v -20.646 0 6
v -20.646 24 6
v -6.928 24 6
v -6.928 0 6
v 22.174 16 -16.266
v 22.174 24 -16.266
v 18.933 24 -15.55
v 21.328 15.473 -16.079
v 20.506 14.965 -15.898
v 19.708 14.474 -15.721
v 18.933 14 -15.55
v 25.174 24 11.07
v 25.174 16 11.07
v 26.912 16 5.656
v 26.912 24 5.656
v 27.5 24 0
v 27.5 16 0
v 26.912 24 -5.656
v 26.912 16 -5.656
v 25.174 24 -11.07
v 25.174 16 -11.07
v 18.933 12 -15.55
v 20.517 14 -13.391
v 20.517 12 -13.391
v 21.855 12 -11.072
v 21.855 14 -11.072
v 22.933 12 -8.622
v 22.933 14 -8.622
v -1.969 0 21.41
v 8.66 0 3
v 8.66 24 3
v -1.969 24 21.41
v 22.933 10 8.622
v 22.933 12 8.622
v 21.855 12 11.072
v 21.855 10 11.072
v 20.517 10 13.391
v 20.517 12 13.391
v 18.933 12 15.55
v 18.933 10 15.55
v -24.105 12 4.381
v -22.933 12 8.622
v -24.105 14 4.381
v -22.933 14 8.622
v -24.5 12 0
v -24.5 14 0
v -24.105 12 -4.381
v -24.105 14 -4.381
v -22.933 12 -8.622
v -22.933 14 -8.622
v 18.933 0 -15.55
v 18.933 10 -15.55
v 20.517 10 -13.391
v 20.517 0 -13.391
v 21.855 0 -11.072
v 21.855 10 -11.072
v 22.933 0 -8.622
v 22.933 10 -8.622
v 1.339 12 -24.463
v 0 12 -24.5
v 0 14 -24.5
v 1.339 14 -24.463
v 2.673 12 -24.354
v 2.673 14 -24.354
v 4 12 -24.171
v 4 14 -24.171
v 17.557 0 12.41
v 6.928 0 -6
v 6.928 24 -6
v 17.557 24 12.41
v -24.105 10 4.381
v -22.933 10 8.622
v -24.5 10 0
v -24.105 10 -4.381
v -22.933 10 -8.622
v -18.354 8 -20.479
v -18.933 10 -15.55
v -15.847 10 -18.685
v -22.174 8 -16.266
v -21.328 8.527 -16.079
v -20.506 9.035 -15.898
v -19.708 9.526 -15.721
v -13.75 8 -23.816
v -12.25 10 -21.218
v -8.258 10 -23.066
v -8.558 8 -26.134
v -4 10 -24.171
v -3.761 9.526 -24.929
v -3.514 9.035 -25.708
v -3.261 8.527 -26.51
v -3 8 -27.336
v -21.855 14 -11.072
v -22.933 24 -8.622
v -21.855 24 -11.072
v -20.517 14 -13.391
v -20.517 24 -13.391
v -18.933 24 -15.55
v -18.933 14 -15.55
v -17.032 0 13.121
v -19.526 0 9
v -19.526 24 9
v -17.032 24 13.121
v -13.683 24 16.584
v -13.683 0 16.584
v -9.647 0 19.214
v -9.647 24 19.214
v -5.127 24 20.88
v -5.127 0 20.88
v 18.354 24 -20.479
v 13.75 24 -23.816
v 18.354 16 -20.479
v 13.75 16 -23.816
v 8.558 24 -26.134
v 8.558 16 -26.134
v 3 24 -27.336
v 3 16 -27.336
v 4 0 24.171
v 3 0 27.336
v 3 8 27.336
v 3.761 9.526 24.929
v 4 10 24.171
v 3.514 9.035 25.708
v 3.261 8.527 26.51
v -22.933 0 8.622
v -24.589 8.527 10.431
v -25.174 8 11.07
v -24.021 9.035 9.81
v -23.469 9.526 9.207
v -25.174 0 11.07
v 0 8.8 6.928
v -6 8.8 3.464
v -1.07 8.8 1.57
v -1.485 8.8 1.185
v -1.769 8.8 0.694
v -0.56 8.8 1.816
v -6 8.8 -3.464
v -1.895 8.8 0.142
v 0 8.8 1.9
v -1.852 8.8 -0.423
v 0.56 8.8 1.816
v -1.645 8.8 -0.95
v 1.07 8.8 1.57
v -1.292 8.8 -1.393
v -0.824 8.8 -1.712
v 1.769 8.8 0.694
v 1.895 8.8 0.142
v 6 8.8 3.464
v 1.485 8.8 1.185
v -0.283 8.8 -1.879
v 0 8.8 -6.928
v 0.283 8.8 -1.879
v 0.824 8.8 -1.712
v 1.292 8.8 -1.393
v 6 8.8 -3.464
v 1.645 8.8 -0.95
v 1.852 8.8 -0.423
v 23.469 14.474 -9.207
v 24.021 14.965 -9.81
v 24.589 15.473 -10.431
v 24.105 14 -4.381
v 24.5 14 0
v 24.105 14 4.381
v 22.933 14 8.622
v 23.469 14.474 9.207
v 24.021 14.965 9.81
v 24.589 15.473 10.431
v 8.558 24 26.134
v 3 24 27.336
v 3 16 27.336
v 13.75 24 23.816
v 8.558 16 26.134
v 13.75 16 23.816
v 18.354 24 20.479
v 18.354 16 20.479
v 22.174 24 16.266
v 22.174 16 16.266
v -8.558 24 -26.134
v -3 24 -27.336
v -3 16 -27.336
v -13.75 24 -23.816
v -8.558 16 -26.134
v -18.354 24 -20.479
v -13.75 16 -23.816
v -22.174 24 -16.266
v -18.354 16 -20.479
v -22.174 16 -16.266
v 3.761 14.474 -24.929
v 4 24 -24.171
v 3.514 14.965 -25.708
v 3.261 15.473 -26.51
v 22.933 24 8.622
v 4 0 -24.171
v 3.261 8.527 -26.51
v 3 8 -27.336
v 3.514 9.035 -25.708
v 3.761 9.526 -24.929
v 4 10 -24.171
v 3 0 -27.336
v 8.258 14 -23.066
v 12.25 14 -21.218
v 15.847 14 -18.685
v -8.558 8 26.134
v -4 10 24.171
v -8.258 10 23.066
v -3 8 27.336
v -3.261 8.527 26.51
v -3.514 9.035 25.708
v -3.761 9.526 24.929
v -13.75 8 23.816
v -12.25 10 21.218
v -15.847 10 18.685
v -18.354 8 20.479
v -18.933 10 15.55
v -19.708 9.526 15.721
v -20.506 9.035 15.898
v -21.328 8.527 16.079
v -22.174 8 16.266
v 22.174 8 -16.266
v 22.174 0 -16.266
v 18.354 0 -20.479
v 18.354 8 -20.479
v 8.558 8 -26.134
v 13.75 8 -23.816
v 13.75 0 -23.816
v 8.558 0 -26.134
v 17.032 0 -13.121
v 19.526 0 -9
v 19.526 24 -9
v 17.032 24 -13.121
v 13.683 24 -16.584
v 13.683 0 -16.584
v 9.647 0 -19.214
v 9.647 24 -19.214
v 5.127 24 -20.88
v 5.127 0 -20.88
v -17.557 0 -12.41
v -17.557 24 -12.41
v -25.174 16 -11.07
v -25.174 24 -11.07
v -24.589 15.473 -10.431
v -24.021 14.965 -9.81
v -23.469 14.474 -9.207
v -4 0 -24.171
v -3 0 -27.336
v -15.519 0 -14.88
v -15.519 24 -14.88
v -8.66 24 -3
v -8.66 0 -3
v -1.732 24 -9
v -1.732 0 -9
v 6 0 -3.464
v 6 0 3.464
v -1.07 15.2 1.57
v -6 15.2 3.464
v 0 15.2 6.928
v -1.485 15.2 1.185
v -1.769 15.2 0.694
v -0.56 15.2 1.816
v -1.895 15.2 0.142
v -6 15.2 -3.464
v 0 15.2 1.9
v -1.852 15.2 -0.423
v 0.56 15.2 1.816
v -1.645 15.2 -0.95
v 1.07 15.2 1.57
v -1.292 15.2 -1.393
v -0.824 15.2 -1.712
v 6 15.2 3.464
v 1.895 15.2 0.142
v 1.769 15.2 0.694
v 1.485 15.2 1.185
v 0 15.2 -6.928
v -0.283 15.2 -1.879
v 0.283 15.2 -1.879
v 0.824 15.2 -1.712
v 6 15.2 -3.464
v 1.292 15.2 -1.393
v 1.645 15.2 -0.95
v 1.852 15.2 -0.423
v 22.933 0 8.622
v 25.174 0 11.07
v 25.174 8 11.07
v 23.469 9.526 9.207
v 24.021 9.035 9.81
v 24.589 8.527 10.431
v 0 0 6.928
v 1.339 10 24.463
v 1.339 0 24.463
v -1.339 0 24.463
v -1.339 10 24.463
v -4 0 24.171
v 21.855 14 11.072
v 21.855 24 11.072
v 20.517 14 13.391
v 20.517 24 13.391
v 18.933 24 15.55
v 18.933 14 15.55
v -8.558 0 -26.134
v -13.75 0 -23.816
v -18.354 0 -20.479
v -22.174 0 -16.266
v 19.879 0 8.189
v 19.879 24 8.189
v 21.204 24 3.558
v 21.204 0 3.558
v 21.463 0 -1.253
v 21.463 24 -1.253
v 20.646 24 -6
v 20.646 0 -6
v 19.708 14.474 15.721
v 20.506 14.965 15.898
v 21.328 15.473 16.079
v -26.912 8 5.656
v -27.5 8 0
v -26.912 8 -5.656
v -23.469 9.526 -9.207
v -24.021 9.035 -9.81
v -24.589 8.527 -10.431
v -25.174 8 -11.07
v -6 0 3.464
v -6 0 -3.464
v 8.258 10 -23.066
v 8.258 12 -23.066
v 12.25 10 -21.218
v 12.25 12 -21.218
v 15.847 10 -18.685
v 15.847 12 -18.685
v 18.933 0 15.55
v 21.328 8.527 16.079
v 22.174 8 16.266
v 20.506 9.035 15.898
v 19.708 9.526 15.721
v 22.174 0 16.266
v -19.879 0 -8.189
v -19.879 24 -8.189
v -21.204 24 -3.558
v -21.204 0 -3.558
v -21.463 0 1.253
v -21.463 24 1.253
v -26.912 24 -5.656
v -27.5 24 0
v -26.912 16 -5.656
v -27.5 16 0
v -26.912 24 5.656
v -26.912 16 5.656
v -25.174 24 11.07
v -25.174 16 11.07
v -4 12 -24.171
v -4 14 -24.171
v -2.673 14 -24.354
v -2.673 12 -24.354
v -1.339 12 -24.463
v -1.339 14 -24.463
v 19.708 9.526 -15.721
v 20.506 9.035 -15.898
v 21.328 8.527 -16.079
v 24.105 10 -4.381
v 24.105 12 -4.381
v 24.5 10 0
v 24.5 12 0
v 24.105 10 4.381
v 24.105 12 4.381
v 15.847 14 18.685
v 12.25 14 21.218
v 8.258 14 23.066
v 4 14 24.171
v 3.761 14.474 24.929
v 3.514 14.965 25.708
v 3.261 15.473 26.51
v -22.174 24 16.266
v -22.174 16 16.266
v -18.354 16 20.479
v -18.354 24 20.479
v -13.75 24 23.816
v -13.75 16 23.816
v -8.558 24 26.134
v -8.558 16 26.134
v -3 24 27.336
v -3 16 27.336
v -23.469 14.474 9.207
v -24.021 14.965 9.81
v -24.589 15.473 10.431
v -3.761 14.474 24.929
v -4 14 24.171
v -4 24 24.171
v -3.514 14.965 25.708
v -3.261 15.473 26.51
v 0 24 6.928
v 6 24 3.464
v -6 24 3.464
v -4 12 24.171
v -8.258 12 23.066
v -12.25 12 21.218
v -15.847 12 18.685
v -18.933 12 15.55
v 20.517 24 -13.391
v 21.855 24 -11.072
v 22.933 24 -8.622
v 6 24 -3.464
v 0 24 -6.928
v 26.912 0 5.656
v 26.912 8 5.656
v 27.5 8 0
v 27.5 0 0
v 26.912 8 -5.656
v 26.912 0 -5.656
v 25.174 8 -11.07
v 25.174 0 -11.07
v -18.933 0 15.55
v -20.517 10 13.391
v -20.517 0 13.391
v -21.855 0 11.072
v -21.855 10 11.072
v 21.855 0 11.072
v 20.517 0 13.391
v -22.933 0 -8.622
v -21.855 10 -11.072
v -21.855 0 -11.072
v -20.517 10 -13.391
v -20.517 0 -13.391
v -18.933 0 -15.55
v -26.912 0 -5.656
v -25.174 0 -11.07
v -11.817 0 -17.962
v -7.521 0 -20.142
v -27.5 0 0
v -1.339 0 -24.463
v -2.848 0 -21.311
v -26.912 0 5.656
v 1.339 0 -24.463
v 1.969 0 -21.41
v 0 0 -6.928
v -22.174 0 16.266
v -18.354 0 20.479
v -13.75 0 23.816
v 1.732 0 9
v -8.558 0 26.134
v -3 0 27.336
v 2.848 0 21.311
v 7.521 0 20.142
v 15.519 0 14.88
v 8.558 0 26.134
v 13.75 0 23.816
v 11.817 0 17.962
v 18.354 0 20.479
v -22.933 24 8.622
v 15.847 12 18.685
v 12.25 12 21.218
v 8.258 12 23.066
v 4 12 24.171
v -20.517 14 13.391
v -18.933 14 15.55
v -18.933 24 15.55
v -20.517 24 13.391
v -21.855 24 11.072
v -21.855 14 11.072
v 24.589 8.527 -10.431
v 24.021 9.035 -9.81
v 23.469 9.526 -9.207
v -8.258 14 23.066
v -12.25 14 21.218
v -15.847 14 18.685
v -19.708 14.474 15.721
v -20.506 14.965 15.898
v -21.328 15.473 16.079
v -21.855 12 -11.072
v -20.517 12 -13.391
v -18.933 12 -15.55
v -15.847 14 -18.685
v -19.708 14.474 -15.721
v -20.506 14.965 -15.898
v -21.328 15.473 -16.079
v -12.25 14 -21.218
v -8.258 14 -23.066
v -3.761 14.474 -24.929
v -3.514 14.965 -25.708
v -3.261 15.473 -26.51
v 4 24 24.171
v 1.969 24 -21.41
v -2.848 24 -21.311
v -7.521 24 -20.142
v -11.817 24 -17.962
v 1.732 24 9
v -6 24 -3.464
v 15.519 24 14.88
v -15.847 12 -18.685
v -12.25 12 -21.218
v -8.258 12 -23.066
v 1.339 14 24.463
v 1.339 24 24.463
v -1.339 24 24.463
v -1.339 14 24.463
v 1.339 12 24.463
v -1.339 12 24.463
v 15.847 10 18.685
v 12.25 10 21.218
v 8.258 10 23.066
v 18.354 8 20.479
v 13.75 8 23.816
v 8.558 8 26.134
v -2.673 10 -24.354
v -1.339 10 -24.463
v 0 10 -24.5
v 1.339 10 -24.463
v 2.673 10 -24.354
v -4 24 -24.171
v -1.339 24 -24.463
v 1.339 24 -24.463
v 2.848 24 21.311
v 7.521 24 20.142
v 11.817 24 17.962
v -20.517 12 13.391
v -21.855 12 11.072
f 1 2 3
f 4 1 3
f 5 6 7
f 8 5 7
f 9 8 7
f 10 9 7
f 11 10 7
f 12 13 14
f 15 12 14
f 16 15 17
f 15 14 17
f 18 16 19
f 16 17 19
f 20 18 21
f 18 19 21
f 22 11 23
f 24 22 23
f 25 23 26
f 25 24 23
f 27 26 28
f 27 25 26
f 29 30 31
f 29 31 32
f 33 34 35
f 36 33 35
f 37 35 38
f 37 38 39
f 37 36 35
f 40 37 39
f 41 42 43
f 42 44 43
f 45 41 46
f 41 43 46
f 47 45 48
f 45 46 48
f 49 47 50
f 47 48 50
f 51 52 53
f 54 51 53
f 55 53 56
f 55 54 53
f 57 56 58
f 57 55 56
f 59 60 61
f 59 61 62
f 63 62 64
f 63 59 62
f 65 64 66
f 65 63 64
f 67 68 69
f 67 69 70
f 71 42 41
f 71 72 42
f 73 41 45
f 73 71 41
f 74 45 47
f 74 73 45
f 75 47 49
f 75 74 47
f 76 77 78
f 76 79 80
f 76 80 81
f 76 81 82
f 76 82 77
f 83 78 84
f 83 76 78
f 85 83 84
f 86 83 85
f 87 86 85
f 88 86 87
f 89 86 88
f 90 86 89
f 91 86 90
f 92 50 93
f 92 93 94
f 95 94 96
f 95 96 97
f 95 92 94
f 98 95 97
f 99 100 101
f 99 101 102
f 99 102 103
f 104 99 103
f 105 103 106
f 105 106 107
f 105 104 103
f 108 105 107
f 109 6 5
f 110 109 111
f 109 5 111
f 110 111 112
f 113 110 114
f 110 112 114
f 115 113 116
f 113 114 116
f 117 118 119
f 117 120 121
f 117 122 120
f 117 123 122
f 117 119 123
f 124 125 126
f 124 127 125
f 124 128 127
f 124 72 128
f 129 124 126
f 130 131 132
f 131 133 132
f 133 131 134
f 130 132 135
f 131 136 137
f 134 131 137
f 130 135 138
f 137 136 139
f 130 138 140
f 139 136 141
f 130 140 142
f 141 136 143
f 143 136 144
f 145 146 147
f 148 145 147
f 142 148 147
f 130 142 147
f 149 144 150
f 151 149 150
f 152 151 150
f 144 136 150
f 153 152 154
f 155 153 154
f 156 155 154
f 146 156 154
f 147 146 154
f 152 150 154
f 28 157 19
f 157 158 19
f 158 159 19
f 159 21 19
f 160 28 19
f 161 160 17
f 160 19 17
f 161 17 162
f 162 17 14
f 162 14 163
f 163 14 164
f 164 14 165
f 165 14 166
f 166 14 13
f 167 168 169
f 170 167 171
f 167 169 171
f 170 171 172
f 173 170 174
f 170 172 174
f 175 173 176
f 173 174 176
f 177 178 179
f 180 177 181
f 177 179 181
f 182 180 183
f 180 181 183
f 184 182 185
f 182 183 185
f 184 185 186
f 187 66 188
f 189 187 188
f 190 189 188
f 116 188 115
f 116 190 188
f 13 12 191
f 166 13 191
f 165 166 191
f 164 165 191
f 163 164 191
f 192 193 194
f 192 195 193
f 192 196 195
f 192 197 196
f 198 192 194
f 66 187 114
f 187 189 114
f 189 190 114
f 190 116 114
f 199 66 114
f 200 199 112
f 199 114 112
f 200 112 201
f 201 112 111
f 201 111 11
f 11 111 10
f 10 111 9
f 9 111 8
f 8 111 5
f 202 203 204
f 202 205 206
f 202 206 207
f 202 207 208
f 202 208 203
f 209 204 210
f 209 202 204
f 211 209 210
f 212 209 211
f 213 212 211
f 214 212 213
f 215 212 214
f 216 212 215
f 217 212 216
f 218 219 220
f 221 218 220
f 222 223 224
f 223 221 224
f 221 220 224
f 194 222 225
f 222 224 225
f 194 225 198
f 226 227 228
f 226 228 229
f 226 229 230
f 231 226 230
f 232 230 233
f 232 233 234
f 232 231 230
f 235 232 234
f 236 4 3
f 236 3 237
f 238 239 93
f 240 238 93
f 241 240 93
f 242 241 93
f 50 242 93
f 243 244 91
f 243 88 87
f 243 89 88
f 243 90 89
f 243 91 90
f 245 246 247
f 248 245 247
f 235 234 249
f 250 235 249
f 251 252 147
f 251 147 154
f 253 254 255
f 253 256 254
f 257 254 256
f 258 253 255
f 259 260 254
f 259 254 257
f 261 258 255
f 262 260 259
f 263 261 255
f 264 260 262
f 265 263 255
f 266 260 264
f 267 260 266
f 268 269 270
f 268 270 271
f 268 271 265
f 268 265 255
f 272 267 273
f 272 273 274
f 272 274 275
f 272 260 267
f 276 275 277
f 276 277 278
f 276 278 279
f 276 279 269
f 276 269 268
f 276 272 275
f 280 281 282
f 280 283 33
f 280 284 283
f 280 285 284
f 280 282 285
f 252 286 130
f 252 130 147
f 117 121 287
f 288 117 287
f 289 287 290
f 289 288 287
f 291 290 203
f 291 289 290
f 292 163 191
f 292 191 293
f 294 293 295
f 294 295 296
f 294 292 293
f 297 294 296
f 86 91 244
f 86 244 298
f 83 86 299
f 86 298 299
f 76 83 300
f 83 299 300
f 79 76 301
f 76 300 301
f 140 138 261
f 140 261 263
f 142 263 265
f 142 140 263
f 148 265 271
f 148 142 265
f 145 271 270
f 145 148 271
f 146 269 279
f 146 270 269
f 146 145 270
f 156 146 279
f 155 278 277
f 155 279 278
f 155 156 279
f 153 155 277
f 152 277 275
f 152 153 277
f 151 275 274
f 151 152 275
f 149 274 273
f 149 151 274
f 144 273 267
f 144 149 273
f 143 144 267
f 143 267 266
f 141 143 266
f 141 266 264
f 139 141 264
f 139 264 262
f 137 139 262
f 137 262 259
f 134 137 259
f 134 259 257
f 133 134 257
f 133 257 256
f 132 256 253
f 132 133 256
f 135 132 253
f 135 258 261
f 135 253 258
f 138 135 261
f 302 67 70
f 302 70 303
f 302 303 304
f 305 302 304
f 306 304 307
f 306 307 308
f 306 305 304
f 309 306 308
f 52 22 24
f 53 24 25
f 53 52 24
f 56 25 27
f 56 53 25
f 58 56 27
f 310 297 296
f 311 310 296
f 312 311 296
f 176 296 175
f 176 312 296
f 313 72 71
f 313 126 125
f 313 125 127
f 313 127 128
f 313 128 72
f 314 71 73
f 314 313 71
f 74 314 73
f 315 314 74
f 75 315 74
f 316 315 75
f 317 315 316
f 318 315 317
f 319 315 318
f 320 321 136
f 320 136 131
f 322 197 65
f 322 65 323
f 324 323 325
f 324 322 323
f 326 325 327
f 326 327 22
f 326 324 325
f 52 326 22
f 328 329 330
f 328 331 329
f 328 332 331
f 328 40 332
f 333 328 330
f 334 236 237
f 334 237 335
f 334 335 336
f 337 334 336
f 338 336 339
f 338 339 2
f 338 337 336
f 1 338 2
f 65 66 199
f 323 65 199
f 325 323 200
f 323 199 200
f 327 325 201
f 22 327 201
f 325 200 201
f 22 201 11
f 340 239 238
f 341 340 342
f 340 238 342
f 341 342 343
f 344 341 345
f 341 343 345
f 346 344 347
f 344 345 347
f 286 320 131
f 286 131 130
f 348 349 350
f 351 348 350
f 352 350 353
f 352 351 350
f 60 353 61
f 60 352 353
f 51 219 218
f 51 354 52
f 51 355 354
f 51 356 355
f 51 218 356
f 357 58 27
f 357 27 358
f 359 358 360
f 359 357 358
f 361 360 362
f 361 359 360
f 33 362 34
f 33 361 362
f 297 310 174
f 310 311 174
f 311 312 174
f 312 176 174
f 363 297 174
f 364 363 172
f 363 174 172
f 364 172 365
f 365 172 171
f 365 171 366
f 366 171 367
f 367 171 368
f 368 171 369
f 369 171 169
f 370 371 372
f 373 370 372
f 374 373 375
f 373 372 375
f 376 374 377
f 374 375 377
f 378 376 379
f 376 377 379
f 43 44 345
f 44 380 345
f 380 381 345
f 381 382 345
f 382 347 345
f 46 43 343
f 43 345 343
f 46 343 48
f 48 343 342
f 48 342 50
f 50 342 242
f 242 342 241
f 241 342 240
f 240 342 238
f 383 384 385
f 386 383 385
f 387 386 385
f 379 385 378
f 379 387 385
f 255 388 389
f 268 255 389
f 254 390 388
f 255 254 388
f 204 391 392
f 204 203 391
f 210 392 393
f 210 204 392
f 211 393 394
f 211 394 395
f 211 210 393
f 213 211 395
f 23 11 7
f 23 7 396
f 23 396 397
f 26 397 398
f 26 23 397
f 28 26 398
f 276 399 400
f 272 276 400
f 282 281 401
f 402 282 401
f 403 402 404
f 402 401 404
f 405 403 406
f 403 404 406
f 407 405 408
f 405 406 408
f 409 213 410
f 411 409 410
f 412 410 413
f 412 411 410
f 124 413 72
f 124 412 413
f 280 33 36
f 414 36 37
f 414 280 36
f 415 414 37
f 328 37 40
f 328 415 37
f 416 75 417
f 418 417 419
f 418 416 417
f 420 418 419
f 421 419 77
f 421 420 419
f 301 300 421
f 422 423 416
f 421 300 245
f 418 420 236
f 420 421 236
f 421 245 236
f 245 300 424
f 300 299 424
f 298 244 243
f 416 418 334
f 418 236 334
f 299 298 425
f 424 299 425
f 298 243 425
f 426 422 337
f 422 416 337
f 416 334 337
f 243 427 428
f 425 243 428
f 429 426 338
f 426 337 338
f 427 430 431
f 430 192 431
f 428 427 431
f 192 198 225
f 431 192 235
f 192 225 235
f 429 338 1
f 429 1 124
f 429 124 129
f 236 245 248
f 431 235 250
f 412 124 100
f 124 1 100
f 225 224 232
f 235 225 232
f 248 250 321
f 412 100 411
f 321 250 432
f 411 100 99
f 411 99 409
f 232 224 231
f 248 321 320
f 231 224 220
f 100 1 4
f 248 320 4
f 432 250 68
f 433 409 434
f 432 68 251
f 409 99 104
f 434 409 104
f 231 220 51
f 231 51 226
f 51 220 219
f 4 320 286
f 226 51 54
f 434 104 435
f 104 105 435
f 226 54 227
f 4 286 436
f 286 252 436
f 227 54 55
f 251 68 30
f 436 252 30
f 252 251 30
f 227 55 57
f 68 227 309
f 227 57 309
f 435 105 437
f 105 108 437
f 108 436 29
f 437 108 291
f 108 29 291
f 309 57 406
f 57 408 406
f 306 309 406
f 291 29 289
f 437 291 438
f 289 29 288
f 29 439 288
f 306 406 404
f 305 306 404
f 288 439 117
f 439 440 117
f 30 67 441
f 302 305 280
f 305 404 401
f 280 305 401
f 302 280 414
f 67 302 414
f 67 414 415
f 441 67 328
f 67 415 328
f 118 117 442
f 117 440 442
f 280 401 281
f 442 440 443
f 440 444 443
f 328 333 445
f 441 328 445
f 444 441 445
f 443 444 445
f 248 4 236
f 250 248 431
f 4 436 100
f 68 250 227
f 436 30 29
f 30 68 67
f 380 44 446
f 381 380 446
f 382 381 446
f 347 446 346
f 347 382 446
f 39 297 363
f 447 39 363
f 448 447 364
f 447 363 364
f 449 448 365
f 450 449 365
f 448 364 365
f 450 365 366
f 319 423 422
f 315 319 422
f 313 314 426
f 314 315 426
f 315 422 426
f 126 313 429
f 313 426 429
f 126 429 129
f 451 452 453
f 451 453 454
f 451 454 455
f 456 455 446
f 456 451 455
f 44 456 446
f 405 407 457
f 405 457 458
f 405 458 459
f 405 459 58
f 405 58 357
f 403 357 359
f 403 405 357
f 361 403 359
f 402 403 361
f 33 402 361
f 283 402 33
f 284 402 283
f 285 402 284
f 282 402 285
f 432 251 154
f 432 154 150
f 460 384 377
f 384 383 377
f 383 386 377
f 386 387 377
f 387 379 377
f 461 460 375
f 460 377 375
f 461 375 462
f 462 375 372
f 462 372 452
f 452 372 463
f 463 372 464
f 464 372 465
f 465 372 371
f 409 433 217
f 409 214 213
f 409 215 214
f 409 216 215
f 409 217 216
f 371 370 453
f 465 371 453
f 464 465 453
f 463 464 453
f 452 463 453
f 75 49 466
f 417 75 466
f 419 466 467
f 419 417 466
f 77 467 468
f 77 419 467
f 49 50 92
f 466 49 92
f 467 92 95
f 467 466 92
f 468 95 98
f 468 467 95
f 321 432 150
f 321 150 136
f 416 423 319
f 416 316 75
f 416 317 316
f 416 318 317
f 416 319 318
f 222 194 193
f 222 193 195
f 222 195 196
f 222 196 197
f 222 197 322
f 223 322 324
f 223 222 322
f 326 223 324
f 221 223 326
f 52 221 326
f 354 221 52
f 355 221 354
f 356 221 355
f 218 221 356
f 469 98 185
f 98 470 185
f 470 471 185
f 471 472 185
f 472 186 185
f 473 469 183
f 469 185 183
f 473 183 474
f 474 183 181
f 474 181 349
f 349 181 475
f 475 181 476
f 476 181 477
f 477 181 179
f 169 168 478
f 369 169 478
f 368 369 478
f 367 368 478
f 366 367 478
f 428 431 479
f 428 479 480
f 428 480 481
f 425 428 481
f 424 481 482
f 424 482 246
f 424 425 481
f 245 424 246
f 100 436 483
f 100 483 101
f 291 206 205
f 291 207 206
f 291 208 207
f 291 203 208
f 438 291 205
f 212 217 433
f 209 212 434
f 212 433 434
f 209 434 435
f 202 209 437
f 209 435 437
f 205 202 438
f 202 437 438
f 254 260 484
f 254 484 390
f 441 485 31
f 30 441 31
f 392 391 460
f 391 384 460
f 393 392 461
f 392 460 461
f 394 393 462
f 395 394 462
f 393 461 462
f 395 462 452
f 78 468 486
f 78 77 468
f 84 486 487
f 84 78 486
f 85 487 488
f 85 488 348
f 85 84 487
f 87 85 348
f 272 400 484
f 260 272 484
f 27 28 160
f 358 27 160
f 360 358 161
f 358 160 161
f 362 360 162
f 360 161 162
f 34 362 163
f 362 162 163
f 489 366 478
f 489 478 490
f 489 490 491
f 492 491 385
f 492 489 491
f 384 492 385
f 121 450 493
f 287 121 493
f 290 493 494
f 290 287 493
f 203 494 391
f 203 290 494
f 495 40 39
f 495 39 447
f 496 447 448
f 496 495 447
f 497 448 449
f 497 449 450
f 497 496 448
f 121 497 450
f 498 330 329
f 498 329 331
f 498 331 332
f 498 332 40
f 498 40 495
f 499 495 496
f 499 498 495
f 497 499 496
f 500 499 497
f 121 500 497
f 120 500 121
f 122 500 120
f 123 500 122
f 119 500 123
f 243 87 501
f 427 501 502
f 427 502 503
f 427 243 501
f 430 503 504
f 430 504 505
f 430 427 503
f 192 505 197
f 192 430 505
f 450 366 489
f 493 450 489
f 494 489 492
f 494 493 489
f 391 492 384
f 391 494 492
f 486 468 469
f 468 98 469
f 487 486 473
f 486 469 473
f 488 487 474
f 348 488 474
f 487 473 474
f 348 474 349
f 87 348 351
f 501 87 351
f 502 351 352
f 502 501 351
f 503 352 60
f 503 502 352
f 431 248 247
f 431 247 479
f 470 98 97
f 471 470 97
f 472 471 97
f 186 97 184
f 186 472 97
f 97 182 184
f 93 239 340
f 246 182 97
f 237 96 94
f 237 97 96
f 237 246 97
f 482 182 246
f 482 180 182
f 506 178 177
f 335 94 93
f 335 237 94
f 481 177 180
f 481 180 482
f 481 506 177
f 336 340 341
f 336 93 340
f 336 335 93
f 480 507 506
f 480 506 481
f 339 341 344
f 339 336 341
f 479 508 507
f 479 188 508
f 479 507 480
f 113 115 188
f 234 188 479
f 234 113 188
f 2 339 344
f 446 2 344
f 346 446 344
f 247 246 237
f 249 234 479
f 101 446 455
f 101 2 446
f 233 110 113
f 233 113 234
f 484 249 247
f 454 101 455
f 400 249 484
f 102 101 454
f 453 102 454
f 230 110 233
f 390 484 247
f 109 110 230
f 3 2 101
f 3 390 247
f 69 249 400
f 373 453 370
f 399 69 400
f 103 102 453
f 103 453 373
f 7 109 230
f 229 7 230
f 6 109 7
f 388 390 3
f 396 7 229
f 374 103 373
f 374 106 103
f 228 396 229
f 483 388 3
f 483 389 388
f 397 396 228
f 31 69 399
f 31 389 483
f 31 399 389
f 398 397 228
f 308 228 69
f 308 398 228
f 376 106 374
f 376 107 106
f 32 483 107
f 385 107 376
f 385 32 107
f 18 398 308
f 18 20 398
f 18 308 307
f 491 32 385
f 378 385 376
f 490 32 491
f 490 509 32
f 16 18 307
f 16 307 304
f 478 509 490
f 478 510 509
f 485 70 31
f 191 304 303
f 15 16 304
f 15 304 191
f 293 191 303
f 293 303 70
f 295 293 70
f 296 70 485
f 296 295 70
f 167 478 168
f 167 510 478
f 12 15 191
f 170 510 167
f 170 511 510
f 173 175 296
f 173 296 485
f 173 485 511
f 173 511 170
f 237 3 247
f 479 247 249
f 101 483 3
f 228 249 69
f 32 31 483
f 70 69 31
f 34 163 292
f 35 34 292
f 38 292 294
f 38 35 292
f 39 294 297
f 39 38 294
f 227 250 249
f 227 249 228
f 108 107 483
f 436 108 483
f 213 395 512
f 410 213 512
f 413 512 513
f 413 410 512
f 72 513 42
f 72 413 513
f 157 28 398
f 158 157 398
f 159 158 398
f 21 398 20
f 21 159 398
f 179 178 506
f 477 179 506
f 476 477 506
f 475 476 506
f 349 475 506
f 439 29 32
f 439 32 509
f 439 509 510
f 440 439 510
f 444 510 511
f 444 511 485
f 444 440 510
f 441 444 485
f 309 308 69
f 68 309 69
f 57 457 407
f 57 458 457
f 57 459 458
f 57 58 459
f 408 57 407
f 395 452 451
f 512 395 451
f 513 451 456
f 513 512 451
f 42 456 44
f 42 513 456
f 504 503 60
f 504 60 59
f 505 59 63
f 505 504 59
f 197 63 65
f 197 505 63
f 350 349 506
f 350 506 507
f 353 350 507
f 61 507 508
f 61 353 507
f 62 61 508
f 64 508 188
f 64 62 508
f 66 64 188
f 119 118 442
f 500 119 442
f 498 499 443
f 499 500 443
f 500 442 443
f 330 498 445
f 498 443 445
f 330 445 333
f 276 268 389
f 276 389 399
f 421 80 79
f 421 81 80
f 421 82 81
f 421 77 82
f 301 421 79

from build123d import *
from build123d.topology import SkipClean

# Parameters (mm, degrees)
SKETCH1_R           = 27.5
BOSS_EXTRUDE1_DEPTH = 24
CUT_EXTRUDE3_START  = -2
CUT_EXTRUDE3_DEPTH  = 48.700109409
CIRPATTERN1_COUNT   = 6
CUT_EXTRUDE4_DEPTH  = 24
CIRPATTERN2_COUNT   = 6
CUT_EXTRUDE5_DEPTH  = 8.8
SKETCH6_R           = 1.9
CUT_EXTRUDE6_DEPTH  = 24


with BuildPart() as part:
    # Sketch1 → Boss-Extrude1 (new body)
    with BuildSketch(Plane(origin=(0, 0, 0), x_dir=(1, 0, 0), z_dir=(0, 1, 0))):
        with Locations(Location((0, 0, 0), (0, 0, 270))):
            Circle(SKETCH1_R)
    extrude(amount=BOSS_EXTRUDE1_DEPTH)

    # Sketch2 → Cut-Extrude3 (cut)
    with BuildSketch(Plane(origin=(0, 0, 0), x_dir=(1, 0, 0), z_dir=(0, 1, 0)).offset(CUT_EXTRUDE3_START)):
        with BuildLine():
            Line((-3, 27.335873866), (-4, 24.171263931))
            ThreePointArc((-4, 24.171263931), (0, 24.5), (4, 24.171263931))
            Line((4, 24.171263931), (3, 27.335873866))
            ThreePointArc((3, 27.335873866), (0, 27.5), (-3, 27.335873866))
        make_face()
    cut_extrude3 = extrude(amount=CUT_EXTRUDE3_DEPTH, mode=Mode.SUBTRACT)

    # CirPattern1: Cut-Extrude3 ×6 about axis
    cirpattern1_axis = Axis((0, 0, 0), (0, 1, 0))
    for i in range(1, CIRPATTERN1_COUNT):
        add(cut_extrude3.rotate(cirpattern1_axis, i * 360 / CIRPATTERN1_COUNT), mode=Mode.SUBTRACT)

    # Sketch3 → Cut-Extrude4 (cut)
    with BuildSketch(Plane(origin=(0, 0, 0), x_dir=(1, 0, 0), z_dir=(0, 1, 0))):
        with BuildLine():
            ThreePointArc((19.52562419, 9), (13.682742888, 16.584105253), (5.126758988, 20.879807046))
            Line((5.126758988, 20.879807046), (-1.732050808, 9))
            Line((-1.732050808, 9), (19.52562419, 9))
        make_face()
    cut_extrude4 = extrude(amount=CUT_EXTRUDE4_DEPTH, mode=Mode.SUBTRACT)

    # CirPattern2: Cut-Extrude4 ×6 about axis
    cirpattern2_axis = Axis((0, 0, 0), (0, 1, 0))
    for i in range(1, CIRPATTERN2_COUNT):
        add(cut_extrude4.rotate(cirpattern2_axis, i * 360 / CIRPATTERN2_COUNT), mode=Mode.SUBTRACT)

    # Sketch5 → Cut-Extrude5 (cut)
    with BuildSketch(Plane(origin=(0, 24, 0), x_dir=(1, 0, 0), z_dir=(0, 1, 0))):
        Polygon((0, 6.92820323), (-6, 3.464101615), (-6, -3.464101615), (0, -6.92820323), (6, -3.464101615), (6, 3.464101615), align=None)
    cut_extrude5 = extrude(amount=-CUT_EXTRUDE5_DEPTH, mode=Mode.SUBTRACT)

    # Sketch6 → Cut-Extrude6 (cut)
    with BuildSketch(Plane(origin=(0, 0, 0), x_dir=(1, 0, 0), z_dir=(0, 1, 0))):
        with Locations(Location((0, 0, 0), (0, 0, 270))):
            Circle(SKETCH6_R)
    extrude(amount=CUT_EXTRUDE6_DEPTH, mode=Mode.SUBTRACT)

    # Mirror1: Cut-Extrude5 across plane
    add(cut_extrude5.mirror(Plane.ZX.offset(12)), mode=Mode.SUBTRACT)

    # Sketch7 → Cut-Revolve1 (revolve, cut)
    with SkipClean():  # the faces are left unmerged after this step: merging them gives an invalid solid
        with BuildSketch(Plane.XY, mode=Mode.PRIVATE) as cut_revolve1_sk:
            Polygon((24.5, 12), (24.5, 14), (27.5, 16), (27.5, 12), align=None)
        cut_revolve1 = revolve(cut_revolve1_sk.sketch.rotate(Axis((0, 24, 0), (0, -1, 0)), 270), axis=Axis((0, 24, 0), (0, -1, 0)), mode=Mode.SUBTRACT)

    # Mirror2: Cut-Revolve1 across plane
    with SkipClean():  # the faces are left unmerged after this step: merging them gives an invalid solid
        add(cut_revolve1.mirror(Plane.ZX.offset(12)), mode=Mode.SUBTRACT)


solid = part.part
